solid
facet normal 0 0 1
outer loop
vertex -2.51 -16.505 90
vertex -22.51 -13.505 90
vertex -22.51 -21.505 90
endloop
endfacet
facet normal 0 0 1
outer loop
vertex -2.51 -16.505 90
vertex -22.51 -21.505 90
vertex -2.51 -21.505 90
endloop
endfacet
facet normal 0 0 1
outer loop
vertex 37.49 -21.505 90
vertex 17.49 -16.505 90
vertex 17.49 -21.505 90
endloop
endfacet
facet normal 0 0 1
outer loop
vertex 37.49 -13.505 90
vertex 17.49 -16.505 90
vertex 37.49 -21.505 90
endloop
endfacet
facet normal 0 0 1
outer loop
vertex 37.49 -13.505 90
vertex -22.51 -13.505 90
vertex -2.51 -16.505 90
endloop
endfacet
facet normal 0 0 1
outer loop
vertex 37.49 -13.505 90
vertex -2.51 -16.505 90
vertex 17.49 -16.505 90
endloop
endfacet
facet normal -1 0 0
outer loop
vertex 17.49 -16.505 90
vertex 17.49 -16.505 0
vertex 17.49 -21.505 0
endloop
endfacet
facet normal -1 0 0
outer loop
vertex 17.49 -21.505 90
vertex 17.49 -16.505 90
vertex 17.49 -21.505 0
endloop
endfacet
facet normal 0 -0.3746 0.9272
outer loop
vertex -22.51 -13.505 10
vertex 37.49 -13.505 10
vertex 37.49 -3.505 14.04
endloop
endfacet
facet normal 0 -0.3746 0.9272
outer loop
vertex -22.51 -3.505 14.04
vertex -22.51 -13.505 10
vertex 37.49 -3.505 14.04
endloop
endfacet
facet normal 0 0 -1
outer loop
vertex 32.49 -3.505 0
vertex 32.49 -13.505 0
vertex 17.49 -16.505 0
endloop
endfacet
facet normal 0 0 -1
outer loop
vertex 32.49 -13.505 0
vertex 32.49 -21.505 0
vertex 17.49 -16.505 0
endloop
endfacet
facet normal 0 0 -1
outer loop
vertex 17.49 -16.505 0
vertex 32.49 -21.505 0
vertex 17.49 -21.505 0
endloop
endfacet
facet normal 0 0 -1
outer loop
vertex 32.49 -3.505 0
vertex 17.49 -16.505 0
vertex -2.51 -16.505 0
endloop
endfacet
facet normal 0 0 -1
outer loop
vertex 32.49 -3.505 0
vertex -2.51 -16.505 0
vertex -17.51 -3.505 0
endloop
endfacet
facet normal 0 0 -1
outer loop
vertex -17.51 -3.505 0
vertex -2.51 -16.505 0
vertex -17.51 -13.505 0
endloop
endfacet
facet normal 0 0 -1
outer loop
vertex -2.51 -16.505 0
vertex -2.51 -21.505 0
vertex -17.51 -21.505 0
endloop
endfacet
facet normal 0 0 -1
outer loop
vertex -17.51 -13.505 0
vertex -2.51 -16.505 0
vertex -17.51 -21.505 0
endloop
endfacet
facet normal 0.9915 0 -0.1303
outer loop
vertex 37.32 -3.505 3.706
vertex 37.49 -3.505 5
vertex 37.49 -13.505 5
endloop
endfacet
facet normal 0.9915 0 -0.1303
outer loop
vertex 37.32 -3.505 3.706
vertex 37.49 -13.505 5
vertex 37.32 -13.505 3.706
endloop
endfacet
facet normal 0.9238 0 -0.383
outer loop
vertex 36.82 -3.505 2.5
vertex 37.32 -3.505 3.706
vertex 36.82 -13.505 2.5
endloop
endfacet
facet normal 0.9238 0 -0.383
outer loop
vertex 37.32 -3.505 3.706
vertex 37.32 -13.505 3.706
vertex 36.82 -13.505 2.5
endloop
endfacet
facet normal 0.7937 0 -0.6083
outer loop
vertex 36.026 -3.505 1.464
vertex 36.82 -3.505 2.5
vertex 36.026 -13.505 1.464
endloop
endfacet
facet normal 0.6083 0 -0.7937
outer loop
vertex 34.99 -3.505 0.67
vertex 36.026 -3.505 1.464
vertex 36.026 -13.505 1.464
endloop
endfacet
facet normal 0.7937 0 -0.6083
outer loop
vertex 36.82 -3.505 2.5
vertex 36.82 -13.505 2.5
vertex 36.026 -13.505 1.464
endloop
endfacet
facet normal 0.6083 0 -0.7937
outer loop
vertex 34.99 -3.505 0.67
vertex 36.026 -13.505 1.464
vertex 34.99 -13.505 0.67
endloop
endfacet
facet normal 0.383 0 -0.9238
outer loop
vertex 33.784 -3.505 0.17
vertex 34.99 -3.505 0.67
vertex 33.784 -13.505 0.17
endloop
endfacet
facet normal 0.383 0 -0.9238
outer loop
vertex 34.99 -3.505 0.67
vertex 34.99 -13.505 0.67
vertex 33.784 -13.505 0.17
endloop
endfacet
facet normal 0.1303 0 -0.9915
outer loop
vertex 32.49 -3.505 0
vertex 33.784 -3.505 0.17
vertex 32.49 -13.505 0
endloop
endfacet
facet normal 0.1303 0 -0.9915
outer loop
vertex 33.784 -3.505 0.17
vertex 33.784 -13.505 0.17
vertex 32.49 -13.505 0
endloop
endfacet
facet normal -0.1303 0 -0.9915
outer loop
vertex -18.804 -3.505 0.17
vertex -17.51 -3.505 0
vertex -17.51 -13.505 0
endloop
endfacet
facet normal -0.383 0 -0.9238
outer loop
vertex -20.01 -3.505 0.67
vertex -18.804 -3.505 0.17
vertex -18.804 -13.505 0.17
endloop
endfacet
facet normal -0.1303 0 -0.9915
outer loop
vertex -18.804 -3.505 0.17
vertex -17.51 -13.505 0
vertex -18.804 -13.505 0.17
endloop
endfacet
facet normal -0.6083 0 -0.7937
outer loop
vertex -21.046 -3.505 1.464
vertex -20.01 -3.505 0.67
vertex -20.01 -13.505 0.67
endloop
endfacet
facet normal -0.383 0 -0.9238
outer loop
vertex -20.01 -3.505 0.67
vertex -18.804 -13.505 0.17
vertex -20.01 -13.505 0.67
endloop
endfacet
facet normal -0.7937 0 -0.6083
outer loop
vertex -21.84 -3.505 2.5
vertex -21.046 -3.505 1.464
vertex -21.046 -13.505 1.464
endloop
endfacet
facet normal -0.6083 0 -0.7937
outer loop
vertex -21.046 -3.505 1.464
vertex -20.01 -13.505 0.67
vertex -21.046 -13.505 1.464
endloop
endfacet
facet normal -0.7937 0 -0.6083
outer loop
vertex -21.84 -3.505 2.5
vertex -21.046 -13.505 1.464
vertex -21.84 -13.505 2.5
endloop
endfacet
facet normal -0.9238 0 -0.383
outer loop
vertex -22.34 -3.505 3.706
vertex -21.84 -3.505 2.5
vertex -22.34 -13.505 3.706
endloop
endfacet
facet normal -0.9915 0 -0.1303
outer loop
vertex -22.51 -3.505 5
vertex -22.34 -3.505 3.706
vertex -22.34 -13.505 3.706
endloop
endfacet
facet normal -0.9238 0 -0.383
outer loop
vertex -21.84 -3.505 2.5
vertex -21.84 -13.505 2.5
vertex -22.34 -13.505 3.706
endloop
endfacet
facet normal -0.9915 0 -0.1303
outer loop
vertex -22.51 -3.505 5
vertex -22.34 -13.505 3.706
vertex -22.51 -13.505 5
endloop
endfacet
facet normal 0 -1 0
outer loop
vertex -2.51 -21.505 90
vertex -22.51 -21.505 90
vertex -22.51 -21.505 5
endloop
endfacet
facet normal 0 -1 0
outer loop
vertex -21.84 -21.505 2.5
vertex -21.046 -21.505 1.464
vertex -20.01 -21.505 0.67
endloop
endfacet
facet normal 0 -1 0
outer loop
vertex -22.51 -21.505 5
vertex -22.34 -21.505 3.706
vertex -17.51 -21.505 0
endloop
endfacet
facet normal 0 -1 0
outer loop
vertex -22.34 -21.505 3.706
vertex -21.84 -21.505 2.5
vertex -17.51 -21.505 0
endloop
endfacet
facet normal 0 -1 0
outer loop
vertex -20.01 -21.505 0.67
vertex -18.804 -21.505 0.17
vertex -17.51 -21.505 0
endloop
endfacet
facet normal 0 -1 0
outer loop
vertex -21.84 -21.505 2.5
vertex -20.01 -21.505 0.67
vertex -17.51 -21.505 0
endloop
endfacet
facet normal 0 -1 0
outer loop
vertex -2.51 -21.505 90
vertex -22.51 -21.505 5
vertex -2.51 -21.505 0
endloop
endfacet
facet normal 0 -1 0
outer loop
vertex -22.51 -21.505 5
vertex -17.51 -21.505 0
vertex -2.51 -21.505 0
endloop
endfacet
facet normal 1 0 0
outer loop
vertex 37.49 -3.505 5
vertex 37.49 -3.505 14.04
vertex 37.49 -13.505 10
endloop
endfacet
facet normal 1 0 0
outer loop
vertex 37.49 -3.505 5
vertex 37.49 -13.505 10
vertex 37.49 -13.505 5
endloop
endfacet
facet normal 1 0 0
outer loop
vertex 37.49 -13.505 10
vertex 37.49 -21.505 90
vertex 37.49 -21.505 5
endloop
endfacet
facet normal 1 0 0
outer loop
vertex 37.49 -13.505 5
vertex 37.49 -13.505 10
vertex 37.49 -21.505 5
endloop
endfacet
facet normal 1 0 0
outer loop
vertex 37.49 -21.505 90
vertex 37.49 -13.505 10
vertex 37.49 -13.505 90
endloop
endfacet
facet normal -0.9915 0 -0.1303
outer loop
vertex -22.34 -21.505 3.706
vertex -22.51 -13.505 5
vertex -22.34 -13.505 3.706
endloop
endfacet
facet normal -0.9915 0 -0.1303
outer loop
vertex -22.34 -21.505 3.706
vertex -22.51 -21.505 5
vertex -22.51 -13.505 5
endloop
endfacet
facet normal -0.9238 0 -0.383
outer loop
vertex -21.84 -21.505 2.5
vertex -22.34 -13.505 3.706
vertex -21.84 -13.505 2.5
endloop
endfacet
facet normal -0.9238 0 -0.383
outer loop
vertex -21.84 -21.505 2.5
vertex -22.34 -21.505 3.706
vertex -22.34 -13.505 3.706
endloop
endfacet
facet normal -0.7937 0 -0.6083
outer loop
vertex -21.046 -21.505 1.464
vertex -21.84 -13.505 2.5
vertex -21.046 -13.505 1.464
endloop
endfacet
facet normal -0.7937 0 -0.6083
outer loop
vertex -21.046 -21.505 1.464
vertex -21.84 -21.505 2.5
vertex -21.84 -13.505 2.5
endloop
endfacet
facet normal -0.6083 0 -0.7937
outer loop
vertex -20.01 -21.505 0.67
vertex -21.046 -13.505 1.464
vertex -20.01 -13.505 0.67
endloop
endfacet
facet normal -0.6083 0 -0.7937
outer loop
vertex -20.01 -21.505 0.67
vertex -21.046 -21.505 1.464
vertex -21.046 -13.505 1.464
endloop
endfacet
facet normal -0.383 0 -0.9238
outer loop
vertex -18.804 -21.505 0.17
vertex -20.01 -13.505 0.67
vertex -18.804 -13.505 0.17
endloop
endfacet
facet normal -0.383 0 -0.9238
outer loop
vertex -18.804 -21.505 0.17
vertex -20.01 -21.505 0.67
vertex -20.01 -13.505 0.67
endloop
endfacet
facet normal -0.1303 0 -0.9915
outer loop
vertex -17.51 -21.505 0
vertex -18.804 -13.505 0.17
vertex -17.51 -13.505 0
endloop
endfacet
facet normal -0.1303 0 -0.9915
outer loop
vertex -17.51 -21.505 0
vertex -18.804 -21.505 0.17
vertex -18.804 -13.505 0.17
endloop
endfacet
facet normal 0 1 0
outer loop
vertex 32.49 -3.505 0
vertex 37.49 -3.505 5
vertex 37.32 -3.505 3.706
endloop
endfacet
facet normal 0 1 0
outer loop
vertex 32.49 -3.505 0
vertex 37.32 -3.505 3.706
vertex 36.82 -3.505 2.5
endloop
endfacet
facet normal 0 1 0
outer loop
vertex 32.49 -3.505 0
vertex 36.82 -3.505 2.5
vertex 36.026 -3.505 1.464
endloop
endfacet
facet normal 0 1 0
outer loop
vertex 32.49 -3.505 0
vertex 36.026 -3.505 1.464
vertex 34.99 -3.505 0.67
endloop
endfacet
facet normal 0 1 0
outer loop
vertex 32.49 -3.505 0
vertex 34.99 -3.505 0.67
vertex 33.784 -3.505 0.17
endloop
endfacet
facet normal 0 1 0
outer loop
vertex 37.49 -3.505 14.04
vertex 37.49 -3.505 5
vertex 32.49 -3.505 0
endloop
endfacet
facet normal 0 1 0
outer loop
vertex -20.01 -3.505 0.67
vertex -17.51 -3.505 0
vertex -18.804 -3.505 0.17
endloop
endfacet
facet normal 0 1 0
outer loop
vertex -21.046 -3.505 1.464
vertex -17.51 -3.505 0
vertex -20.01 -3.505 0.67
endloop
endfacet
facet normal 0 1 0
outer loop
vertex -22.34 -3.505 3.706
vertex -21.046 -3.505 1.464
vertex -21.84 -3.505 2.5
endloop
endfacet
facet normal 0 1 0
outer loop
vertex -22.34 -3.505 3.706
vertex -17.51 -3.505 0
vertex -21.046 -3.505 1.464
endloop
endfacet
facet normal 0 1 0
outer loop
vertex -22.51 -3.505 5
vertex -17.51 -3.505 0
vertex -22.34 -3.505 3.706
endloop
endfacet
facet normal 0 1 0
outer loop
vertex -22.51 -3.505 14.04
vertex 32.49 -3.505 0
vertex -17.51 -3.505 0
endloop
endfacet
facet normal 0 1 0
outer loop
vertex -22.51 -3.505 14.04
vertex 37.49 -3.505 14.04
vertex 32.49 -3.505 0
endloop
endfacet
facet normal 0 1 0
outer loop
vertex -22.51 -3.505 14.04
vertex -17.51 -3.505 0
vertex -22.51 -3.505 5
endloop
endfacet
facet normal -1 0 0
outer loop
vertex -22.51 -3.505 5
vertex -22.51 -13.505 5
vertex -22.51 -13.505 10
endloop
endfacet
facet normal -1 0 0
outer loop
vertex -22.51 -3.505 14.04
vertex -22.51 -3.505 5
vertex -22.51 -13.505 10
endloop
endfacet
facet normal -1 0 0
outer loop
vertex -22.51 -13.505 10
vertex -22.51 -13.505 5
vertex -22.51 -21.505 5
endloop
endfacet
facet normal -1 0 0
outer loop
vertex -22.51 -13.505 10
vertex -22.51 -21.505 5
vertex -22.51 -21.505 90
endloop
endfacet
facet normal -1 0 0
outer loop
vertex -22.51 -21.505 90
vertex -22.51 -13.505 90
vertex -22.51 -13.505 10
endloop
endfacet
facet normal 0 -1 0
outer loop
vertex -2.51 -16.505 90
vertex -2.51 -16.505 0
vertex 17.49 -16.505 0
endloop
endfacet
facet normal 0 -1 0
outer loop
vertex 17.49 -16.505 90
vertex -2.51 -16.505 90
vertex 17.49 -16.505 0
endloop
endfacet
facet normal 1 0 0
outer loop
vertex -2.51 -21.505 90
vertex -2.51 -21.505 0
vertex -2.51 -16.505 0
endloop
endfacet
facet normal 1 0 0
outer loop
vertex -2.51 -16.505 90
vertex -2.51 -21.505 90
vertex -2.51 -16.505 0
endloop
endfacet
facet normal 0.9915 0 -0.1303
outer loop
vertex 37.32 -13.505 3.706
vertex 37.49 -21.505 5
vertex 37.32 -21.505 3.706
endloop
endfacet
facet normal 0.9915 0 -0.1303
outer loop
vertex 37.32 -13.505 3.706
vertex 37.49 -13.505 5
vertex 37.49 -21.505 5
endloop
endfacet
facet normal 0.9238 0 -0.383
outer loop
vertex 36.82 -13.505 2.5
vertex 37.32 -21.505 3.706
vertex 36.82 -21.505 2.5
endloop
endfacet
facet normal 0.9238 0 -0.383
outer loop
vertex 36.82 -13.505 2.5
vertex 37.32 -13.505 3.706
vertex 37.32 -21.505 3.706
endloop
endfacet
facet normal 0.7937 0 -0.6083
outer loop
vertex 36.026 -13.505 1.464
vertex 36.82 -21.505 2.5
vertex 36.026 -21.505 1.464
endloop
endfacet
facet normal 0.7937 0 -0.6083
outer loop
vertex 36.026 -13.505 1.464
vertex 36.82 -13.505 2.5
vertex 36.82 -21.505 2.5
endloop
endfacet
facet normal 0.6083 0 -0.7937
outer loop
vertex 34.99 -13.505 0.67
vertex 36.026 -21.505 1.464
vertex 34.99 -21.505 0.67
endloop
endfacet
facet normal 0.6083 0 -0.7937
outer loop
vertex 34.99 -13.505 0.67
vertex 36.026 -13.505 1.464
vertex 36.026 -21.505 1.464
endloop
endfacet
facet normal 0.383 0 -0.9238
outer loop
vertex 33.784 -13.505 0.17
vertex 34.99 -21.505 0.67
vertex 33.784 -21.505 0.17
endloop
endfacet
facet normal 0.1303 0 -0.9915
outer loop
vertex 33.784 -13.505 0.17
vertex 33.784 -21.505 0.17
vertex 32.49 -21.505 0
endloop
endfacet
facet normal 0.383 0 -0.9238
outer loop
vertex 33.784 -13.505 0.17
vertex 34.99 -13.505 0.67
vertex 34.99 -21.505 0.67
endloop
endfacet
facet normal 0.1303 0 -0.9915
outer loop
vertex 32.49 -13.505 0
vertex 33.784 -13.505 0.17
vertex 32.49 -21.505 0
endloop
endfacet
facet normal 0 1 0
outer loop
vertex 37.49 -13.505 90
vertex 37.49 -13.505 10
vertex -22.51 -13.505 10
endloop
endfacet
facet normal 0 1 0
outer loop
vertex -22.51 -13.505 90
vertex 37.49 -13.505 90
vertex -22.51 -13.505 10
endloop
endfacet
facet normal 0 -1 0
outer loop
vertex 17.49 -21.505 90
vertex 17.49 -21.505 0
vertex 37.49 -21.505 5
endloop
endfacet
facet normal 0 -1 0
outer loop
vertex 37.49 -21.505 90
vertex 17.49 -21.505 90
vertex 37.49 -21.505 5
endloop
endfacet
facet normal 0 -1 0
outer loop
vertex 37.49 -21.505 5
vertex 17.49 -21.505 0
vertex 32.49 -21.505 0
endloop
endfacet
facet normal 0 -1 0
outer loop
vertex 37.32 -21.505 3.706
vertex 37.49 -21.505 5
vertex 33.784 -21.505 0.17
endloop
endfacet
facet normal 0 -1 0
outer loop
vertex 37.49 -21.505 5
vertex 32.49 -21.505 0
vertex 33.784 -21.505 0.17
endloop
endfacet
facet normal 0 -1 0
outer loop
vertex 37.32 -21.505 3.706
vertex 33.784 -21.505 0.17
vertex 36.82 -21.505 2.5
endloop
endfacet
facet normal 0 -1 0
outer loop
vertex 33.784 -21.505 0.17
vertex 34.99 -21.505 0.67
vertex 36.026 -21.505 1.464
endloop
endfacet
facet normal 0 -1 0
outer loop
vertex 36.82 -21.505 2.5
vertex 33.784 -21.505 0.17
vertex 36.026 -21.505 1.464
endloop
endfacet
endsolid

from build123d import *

# Parameters (mm, degrees)
F1_DEPTH = 90
F2_R     = 5
F4_DEPTH = 10
F6_DEPTH = 60.001


with BuildPart() as f1:
    # F0 (on Top) → F1 (new body)
    with BuildSketch(Plane.XY):
        Polygon((17.489978, -16.504586), (17.489978, -21.504586), (37.489978, -21.504586), (37.489978, -13.504586), (-22.510022, -13.504586), (-22.510022, -21.504586), (-2.510022, -21.504586), (-2.510022, -16.504586), align=None)
    extrude(amount=F1_DEPTH)

    # F2
    f2_edges = [f1.edges().sort_by_distance(p)[0] for p in [
        (-22.510022, -17.504586, 0),
        (37.489978, -17.504586, 0),
    ]]
    fillet(f2_edges, radius=F2_R)

    # F3 (on face) → F4 (join)
    with BuildSketch(Plane(origin=(0, -13.504586, 0), x_dir=(-1, 0, 0), z_dir=(0, 1, 0))):
        with BuildLine():
            Line((22.510022, 5), (22.510022, 20))
            Line((22.510022, 20), (-37.489978, 20))
            Line((-37.489978, 20), (-37.489978, 5))
            ThreePointArc((-37.489978, 5), (-36.025512, 1.464466), (-32.489978, 0))
            Line((-32.489978, 0), (17.510022, 0))
            ThreePointArc((17.510022, 0), (21.045556, 1.464466), (22.510022, 5))
        make_face()
    extrude(amount=F4_DEPTH)

    # F5 (on face) → F6 (cut, through all)
    with BuildSketch(Plane.YZ.offset(37.489978)):
        Polygon((-13.504586, 10), (-3.504586, 14.040262), (-3.504586, 20), (-13.504586, 20), align=None)
    extrude(amount=-F6_DEPTH, mode=Mode.SUBTRACT)


solid = f1.part
